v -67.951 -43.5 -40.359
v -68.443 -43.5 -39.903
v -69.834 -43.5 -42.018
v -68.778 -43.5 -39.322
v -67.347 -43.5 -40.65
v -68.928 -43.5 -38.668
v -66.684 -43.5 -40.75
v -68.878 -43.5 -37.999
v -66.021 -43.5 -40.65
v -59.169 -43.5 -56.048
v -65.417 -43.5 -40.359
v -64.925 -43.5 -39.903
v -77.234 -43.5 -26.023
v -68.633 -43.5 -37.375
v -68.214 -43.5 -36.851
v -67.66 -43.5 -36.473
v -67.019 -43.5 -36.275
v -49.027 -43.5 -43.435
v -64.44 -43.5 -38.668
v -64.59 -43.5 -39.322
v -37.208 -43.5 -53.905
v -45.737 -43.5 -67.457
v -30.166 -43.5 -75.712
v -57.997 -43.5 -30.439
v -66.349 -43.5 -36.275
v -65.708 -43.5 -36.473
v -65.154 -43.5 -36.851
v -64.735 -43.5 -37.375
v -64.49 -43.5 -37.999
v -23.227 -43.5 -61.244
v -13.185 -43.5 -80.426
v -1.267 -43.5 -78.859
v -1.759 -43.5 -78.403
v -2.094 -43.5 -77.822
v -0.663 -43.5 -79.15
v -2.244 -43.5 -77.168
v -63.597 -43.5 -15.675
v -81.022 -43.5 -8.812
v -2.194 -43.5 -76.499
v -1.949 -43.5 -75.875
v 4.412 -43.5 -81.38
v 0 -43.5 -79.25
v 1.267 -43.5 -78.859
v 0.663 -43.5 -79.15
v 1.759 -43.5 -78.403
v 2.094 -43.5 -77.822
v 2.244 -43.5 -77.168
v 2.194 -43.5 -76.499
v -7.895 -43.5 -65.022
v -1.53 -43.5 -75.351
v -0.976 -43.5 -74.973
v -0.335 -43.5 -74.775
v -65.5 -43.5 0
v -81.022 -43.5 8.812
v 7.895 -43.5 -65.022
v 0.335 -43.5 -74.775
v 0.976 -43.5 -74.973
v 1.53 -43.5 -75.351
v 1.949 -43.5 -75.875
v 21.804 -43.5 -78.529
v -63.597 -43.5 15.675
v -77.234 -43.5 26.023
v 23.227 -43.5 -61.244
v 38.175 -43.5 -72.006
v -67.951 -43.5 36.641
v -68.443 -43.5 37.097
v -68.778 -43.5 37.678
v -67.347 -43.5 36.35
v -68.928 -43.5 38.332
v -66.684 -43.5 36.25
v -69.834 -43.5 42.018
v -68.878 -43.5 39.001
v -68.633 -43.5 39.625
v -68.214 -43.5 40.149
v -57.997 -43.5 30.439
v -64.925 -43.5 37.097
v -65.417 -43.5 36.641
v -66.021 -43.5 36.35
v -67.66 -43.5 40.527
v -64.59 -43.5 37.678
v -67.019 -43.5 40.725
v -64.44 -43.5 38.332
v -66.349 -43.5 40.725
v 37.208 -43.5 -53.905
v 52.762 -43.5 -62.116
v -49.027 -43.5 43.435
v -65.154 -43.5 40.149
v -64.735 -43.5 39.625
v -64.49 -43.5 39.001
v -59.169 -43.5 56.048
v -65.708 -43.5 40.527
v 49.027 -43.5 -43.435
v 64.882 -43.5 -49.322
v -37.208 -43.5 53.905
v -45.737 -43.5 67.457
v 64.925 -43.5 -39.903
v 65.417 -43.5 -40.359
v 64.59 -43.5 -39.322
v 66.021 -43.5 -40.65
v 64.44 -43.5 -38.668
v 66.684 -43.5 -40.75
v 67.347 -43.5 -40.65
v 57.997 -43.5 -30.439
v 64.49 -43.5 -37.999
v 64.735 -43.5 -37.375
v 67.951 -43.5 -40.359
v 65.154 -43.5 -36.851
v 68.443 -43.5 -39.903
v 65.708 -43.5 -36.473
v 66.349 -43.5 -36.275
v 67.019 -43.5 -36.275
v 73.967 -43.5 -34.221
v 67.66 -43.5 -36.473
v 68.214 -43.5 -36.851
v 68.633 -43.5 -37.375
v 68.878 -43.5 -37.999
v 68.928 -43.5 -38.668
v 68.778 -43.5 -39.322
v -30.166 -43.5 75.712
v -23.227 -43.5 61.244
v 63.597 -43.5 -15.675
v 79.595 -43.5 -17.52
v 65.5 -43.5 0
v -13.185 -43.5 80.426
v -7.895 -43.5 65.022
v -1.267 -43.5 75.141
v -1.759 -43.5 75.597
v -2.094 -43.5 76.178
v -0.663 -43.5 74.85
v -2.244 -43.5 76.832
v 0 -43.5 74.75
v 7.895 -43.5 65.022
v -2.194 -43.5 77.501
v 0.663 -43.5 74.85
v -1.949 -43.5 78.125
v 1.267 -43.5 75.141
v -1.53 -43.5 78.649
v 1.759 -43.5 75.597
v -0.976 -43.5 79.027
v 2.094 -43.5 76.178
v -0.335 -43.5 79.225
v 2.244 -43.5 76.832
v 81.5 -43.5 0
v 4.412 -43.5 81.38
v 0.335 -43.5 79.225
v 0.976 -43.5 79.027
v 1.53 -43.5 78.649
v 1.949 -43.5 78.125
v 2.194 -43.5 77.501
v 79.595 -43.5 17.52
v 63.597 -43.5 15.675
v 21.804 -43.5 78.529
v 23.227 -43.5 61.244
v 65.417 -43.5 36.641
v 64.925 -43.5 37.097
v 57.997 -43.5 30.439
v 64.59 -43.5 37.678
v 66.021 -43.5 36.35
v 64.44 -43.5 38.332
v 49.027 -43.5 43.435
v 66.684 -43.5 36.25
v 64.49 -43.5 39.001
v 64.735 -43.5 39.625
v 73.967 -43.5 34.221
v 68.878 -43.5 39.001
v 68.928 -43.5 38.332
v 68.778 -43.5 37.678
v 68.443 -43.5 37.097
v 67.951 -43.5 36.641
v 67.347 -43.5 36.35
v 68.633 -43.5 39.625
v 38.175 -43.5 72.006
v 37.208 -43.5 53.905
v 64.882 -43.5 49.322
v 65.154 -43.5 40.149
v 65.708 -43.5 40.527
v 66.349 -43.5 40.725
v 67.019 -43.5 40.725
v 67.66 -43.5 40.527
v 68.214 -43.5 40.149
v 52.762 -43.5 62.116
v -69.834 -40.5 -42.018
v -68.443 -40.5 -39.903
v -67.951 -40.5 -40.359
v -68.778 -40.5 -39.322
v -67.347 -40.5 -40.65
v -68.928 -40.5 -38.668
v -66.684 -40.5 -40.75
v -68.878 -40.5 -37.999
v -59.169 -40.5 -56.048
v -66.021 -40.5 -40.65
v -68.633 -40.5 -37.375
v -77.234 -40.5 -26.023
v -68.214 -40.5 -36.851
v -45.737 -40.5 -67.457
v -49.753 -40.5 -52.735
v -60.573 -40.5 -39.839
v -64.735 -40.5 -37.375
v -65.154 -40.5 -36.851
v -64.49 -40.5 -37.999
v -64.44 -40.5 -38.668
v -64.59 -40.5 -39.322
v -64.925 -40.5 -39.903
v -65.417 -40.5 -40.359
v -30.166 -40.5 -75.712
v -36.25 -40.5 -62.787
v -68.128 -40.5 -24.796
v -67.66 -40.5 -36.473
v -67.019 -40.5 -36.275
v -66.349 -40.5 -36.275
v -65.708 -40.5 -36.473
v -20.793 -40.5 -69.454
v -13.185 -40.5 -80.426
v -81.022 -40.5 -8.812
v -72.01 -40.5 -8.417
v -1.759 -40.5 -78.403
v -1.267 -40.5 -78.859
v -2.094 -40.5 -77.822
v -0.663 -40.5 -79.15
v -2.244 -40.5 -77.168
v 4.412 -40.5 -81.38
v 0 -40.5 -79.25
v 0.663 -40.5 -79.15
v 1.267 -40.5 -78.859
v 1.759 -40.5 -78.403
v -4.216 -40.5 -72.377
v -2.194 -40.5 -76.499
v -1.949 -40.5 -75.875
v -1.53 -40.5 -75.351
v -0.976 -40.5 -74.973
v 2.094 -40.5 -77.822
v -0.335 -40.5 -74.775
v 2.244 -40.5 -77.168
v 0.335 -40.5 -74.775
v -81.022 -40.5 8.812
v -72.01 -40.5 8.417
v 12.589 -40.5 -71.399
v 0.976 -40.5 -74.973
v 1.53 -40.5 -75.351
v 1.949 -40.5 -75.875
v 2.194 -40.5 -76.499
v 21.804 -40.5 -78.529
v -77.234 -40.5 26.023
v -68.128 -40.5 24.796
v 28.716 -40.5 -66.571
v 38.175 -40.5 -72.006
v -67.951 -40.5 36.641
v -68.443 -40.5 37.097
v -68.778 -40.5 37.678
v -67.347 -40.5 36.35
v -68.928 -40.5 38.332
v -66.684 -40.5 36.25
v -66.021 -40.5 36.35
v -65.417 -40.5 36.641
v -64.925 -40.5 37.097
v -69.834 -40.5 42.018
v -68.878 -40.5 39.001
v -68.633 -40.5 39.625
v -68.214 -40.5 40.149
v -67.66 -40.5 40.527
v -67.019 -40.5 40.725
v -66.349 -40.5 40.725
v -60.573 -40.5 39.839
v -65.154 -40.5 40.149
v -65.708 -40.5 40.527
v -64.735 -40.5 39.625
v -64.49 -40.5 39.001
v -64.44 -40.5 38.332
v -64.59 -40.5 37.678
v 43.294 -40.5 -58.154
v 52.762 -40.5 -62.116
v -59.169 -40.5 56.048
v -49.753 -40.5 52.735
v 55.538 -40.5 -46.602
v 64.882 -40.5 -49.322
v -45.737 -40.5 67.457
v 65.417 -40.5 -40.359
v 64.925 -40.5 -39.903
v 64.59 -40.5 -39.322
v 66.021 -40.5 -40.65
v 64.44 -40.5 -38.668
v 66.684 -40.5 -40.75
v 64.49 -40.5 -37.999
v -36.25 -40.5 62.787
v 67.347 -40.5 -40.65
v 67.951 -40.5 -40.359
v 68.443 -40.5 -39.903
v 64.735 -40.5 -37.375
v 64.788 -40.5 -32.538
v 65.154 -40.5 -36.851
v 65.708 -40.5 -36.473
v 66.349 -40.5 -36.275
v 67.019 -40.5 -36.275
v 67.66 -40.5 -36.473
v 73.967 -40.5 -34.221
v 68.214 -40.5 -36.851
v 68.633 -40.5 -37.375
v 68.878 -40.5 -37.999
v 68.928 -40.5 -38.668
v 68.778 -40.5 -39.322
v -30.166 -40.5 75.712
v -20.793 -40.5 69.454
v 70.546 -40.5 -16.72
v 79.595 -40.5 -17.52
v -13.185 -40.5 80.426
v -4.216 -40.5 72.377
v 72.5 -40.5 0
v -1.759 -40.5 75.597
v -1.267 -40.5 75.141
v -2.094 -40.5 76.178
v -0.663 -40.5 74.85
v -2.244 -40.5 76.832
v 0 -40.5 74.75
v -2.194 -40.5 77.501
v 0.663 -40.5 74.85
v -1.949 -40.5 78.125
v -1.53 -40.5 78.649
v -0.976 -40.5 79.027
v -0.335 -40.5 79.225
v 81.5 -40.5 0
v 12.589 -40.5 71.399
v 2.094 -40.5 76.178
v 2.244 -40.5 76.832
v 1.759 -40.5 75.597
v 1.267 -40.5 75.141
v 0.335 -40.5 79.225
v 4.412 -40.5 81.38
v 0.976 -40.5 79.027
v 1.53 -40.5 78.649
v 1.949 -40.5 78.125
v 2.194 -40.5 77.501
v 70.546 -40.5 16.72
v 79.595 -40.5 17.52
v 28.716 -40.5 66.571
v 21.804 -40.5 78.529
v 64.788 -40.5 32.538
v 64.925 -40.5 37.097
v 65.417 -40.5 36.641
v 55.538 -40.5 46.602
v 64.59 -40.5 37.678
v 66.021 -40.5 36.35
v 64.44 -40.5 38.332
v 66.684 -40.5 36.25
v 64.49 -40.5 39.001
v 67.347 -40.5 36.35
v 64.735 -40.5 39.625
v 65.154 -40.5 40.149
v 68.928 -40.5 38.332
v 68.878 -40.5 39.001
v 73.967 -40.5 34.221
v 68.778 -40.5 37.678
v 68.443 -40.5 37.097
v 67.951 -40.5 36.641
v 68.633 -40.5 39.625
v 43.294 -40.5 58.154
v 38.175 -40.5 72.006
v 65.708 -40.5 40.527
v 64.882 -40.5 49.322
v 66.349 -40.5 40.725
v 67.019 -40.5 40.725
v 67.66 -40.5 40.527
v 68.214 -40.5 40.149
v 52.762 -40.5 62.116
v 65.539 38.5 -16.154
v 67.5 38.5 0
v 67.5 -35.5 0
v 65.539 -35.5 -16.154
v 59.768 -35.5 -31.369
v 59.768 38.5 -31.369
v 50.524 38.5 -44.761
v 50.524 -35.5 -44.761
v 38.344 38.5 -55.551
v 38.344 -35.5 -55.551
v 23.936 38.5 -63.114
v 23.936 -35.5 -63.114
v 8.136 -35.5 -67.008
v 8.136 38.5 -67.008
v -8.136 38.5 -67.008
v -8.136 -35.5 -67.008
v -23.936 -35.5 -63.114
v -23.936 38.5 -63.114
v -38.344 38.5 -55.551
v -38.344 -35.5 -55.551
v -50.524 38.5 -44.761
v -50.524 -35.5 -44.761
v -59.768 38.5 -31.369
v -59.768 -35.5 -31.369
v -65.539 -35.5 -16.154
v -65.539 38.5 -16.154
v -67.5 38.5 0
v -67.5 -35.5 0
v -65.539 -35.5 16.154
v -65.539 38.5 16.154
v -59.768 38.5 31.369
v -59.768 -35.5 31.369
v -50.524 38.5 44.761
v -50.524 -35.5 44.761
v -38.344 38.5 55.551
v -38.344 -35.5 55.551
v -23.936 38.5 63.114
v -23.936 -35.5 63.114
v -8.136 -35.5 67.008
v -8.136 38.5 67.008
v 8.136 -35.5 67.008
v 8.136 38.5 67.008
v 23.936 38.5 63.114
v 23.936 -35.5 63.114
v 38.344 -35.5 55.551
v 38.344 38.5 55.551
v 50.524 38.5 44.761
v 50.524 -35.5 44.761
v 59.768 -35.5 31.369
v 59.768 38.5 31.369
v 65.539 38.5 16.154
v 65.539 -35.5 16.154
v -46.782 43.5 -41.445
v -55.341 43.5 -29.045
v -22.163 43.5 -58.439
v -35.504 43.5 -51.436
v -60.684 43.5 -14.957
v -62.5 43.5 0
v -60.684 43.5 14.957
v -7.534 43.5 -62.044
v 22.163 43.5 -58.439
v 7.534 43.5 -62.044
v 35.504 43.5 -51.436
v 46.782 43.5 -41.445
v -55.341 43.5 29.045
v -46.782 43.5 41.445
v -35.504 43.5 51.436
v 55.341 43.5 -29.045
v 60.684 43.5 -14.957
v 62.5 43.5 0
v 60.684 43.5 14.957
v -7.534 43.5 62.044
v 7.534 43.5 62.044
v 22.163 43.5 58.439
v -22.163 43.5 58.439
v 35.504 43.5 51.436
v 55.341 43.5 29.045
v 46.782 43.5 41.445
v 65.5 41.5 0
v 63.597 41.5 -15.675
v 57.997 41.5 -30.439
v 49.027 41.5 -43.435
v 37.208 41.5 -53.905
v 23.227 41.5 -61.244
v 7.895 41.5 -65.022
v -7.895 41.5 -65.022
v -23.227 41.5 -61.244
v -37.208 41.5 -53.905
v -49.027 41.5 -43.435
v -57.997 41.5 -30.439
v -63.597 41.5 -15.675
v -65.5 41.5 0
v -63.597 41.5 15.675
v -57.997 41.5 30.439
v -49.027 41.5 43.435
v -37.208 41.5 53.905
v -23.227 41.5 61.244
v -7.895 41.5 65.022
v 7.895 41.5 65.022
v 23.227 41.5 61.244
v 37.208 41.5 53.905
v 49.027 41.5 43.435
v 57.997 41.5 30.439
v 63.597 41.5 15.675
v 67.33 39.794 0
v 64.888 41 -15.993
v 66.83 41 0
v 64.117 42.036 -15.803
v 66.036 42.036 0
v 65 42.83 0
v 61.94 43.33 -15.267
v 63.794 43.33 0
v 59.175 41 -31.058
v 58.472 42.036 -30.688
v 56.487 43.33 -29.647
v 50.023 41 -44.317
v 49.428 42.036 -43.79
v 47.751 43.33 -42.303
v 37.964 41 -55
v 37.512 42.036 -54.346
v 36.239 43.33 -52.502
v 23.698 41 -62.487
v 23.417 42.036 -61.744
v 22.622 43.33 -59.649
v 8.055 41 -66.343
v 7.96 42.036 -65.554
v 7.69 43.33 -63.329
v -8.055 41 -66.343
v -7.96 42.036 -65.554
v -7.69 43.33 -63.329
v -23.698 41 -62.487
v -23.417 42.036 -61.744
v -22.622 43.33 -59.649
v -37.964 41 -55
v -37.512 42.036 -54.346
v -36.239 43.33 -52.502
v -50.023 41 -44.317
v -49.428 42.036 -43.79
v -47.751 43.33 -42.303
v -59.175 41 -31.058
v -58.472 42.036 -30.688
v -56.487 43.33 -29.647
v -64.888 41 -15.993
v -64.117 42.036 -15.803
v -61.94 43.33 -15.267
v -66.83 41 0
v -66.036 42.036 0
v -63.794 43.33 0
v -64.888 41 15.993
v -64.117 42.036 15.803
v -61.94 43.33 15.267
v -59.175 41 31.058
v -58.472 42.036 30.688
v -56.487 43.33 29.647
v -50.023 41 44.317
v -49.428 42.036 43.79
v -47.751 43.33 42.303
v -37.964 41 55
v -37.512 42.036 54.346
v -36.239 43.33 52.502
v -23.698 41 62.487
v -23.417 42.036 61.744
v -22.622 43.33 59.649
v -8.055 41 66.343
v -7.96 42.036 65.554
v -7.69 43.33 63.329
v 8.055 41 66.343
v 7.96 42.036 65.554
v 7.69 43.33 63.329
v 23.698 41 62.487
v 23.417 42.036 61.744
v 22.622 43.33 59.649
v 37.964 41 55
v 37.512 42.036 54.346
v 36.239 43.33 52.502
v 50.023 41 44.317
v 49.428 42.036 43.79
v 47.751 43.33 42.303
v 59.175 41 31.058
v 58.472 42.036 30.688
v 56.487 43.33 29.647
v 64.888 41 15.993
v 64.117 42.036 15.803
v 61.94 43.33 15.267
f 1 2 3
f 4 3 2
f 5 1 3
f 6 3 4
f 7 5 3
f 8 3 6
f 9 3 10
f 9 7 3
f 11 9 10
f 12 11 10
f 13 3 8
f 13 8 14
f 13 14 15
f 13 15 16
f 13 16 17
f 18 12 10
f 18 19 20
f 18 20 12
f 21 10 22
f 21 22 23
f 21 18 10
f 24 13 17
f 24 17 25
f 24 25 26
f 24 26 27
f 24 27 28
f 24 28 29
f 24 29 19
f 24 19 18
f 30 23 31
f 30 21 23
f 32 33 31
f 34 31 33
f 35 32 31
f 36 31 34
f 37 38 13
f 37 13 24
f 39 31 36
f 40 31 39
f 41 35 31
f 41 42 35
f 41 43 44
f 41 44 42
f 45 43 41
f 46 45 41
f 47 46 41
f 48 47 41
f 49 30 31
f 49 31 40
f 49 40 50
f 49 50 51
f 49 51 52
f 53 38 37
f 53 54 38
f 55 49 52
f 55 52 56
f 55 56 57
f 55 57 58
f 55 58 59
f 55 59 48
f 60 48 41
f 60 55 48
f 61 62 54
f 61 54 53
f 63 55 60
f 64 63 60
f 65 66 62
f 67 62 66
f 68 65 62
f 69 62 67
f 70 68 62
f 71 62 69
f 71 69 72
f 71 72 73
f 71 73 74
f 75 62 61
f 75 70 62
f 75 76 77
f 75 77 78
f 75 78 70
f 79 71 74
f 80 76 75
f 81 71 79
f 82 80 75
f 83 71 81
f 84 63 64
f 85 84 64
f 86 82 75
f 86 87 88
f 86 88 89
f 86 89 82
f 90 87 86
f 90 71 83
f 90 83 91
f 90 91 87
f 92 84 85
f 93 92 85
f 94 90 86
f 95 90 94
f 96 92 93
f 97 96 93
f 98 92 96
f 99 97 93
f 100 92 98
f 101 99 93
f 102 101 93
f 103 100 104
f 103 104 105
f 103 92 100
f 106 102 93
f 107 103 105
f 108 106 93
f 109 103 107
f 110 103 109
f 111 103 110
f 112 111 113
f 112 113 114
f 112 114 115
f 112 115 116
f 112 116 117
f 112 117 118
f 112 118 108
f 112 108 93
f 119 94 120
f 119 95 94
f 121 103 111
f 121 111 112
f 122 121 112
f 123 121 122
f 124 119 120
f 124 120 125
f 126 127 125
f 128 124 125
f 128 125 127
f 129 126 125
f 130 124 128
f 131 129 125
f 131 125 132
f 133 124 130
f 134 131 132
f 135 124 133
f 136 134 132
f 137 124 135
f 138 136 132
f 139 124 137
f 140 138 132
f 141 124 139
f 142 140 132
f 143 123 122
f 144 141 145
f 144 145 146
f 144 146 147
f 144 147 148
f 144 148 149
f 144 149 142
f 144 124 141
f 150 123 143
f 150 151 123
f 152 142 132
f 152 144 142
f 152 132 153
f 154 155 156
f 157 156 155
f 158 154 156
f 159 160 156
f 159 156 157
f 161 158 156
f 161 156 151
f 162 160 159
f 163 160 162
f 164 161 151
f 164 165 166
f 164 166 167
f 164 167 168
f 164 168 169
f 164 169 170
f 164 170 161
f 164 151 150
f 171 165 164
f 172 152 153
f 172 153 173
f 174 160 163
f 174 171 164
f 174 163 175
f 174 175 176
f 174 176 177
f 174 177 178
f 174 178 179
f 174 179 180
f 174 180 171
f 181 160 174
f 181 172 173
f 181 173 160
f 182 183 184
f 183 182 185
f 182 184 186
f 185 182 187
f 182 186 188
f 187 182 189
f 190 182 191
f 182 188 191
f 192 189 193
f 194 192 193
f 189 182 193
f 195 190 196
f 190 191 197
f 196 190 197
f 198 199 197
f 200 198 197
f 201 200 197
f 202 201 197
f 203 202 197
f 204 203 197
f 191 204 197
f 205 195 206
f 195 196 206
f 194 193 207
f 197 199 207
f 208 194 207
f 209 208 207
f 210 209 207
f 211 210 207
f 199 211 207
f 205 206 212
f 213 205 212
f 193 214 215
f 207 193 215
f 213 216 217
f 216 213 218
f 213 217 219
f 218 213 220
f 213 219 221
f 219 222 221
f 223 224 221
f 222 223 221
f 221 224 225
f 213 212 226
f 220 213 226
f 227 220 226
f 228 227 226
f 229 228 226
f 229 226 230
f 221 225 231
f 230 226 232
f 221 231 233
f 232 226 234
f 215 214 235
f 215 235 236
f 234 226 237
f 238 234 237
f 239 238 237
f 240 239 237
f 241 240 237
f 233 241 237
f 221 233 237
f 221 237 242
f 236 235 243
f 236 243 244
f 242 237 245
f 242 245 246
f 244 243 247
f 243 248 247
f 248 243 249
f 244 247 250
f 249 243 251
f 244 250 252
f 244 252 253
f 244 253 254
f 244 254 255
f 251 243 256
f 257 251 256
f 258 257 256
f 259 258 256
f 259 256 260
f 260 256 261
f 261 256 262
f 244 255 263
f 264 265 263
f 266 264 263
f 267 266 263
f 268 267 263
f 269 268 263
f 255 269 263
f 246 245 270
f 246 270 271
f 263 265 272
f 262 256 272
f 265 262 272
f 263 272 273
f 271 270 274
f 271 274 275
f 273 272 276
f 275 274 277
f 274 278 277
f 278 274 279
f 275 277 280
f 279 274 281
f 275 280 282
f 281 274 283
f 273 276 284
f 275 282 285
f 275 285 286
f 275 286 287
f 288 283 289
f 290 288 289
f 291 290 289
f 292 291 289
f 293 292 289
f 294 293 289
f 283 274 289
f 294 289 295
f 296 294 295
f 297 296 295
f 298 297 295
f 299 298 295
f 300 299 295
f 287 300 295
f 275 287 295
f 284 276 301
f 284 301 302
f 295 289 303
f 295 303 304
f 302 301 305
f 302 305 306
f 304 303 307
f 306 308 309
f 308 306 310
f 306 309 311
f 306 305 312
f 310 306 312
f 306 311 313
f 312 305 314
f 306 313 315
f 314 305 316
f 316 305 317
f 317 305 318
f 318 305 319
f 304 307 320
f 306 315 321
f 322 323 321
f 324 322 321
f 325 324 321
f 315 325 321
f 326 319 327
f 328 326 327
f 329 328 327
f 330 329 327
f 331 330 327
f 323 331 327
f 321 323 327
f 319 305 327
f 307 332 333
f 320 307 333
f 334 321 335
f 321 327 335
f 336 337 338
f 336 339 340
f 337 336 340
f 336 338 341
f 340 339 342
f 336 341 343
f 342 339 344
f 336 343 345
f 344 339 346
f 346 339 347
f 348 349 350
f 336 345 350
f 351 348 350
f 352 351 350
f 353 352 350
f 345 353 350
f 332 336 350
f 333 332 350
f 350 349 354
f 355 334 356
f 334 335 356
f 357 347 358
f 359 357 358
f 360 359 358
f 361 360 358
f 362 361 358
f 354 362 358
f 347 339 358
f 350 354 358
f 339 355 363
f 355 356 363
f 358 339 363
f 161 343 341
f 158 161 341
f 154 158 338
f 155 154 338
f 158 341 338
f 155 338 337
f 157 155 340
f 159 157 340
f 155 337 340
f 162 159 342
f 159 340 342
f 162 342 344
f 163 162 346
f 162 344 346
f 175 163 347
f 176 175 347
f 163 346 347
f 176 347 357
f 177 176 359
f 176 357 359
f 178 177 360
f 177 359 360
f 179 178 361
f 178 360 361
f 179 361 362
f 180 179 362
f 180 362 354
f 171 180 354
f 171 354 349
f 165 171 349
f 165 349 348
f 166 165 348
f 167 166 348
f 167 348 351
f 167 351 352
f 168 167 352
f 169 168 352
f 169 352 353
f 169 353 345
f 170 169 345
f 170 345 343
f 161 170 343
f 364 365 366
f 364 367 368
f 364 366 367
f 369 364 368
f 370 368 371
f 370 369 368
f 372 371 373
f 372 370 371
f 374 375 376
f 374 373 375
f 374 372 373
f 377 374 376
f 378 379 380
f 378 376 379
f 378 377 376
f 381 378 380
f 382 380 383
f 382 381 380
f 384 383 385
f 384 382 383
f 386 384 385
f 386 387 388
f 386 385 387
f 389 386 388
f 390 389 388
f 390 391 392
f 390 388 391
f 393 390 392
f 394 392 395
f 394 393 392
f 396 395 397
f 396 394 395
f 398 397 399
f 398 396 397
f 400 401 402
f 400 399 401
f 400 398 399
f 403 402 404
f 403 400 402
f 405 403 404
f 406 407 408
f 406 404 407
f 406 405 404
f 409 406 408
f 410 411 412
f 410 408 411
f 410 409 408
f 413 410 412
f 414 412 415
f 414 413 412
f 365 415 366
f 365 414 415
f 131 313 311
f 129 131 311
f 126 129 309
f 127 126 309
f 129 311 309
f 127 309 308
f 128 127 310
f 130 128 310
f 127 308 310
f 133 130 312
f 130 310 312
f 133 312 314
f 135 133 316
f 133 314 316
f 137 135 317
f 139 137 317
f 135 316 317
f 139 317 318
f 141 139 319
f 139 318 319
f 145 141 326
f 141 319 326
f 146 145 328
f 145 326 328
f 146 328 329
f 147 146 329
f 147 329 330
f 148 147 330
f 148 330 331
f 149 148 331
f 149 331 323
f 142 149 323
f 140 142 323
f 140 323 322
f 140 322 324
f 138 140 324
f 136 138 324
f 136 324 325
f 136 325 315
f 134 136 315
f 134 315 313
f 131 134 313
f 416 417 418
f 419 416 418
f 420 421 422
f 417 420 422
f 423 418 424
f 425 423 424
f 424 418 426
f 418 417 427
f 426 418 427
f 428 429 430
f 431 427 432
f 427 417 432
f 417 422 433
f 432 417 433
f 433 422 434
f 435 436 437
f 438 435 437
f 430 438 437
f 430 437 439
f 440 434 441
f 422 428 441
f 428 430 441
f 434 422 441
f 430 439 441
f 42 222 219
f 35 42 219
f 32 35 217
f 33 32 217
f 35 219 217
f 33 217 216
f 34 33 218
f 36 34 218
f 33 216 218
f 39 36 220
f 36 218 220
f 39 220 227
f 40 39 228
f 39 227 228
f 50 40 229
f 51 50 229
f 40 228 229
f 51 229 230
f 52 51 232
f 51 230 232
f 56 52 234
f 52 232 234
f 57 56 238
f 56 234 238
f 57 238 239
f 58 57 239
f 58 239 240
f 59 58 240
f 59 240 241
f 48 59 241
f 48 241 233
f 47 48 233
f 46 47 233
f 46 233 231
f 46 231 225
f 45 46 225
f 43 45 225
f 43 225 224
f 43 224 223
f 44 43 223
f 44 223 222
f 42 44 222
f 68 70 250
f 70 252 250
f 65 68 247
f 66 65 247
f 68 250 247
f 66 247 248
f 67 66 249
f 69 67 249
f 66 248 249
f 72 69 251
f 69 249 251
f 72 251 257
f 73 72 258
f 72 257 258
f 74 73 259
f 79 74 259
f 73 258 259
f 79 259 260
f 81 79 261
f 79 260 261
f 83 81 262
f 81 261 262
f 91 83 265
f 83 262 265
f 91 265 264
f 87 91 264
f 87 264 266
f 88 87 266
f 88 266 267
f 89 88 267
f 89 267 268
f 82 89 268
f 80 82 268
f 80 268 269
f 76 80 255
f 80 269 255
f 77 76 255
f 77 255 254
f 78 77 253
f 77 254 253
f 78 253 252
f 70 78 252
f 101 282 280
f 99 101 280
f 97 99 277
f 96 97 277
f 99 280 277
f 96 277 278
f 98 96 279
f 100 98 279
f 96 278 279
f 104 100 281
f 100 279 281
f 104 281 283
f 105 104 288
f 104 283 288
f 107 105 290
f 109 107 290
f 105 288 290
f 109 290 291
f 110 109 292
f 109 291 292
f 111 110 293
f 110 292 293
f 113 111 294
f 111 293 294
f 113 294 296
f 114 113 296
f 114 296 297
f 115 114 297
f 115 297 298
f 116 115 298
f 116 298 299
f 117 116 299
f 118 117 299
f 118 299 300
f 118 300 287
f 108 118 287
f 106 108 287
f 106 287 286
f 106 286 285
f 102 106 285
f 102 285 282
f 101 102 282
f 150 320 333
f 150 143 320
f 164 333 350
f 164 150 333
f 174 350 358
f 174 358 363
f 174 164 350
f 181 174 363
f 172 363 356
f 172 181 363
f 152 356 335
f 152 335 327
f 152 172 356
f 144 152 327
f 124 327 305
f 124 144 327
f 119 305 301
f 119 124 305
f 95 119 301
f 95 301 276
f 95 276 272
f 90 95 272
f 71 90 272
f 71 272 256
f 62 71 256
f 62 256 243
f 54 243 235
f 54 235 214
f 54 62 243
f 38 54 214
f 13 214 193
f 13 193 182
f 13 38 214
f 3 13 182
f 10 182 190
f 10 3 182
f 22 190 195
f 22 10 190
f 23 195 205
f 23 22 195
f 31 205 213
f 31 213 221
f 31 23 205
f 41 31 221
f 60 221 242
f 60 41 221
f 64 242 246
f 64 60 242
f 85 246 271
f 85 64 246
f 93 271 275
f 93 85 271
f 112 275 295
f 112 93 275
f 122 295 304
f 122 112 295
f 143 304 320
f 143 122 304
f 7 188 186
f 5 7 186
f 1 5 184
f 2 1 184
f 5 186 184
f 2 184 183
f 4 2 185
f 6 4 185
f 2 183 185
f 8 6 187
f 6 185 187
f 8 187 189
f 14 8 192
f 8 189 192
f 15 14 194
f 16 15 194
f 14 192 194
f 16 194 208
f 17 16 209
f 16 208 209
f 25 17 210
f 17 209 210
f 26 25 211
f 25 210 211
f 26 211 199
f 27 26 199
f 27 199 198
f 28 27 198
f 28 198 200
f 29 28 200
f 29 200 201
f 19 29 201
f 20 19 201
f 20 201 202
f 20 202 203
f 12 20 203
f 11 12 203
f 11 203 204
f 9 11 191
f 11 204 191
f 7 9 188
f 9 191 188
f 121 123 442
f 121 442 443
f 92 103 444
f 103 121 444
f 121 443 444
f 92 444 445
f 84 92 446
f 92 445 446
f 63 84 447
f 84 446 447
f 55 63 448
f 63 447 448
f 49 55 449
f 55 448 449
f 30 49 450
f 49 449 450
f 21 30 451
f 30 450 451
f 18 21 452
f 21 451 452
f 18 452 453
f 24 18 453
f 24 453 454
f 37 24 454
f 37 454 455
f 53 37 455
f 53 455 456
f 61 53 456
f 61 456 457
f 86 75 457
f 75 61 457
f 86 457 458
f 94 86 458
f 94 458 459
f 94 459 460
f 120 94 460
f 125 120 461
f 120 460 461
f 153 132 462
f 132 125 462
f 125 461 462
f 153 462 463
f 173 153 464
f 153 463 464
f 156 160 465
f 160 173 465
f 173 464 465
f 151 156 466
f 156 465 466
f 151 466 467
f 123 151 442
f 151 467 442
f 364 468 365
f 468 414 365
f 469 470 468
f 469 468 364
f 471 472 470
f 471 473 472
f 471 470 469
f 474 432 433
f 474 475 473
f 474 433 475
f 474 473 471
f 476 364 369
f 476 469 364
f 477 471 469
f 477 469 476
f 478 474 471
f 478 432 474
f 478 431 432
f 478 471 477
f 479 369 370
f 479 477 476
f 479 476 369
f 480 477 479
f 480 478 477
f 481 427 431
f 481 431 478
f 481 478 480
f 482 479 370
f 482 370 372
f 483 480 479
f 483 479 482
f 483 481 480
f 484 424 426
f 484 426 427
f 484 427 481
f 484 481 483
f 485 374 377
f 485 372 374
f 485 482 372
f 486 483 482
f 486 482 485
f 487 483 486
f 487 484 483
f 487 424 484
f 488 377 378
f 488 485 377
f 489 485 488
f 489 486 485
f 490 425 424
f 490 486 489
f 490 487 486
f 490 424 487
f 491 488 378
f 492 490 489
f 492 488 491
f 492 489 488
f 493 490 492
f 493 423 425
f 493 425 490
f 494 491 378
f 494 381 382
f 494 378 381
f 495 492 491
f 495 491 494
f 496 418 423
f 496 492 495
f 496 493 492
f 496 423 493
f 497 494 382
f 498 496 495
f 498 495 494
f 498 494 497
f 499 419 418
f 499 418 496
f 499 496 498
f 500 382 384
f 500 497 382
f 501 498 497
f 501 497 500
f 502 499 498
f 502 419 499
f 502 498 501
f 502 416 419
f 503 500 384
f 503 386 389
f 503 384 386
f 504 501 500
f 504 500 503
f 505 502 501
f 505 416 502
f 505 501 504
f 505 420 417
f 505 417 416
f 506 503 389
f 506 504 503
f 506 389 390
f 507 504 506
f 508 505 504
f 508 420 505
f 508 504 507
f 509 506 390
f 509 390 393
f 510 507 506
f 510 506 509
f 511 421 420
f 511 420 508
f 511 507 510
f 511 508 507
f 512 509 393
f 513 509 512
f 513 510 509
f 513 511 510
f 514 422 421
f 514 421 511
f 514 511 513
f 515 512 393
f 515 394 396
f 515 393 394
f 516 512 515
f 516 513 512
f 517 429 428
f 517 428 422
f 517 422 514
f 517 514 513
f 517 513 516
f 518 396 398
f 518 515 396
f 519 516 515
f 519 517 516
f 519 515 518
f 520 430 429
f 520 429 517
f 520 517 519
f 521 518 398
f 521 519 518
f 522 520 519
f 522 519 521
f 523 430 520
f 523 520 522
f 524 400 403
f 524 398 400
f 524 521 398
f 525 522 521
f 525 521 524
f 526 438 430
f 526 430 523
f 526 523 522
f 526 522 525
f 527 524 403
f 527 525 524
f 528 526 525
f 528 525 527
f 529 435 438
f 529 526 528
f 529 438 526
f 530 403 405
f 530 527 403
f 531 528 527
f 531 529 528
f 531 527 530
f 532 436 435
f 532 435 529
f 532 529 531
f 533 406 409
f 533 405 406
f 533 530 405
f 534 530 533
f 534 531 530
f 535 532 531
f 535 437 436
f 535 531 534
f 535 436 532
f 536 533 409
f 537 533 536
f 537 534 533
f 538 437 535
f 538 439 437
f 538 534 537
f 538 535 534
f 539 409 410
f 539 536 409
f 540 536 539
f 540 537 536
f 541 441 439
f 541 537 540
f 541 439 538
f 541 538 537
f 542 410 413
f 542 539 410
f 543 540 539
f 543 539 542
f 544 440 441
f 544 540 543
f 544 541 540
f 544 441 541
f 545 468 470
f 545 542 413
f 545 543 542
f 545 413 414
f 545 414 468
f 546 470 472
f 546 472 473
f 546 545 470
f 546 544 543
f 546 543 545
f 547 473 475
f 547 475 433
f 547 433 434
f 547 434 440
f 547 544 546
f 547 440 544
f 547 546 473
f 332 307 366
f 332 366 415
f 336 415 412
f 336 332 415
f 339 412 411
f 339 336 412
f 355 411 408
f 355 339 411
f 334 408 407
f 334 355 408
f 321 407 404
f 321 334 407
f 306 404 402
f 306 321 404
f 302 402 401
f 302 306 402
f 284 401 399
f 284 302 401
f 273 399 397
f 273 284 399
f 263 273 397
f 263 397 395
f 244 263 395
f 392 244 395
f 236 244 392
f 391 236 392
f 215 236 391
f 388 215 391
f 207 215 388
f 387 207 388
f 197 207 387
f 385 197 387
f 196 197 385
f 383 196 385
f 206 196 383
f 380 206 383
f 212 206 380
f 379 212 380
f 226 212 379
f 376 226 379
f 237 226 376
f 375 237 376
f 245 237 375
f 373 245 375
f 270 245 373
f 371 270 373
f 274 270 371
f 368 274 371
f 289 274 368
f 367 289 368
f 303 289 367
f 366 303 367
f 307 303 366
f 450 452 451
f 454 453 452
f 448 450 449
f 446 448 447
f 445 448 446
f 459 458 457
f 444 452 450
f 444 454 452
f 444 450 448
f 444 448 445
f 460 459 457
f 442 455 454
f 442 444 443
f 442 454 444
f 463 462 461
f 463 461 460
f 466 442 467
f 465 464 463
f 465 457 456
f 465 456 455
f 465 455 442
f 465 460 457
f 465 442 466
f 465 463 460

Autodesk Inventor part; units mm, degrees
ref_plane "YZ Plane" through (0, 0, 0) normal (1, 0, 0) x (0, 1, 0)
ref_plane "XZ Plane" through (0, 0, 0) normal (0, 1, 0) x (-1, 0, 0)
ref_plane "XY Plane" through (0, 0, 0) normal (0, 0, 1) x (1, 0, 0)
sketch "Sketch1" plane through (0, 0, 0) normal (0, 0, 1) x (1, 0, 0)
  line L0 (-16.3, 0) -> (97.8, 0) construction
  line L1 (0, 60.9) -> (0, -60.9) construction
  line L2 (65.5, -43.5) -> (65.5, 41.5)
  line L3 (81.5, -40.5) -> (81.5, -43.5)
  line L4 (81.5, -43.5) -> (65.5, -43.5)
  line L5 (67.5, -35.5) -> (67.5, 43.5)
  line L6 (81.5, -40.5) -> (72.5, -40.5)
  line L7 (72.5, -40.5) -> (67.5, -35.5)
  line L8 (67.5, 43.5) -> (0, 43.5)
  line L9 (65.5, 41.5) -> (0, 41.5)
  line L10 (0, 43.5) -> (0, 41.5)
  point P0 (0, 0)
  dimension "d5" = 81.5
  dimension "d7" = 9
  dimension "d8" = 5
  dimension "d9" = 45
  dimension "d10" = 16
  dimension "d11" = 3
  dimension "d30" = 2
  dimension "d32" = 2
  dimension "d34" = 87
revolve "Revolution1" add sketch "Sketch1" angle 360 about axis through (0, 0, 0) along (0, -1, 0)
sketch "Sketch2" plane through (0, -43.5, 0) normal (0, -1, 0) x (1, 0, 0)
  line L0 (0, 114.1) -> (0, -114.1) construction
  line L1 (-114.1, 0) -> (114.1, 0) construction
  circle A0 centre (0, 0) radius 81.5 construction
  circle A1 centre (0, 0) radius 65.5 construction
  circle A2 centre (0, 0) radius 77 construction
  circle A3 centre (0, 0) radius 72.5 construction
  point P0 (0, 77)
  point P1 (-66.684, 38.5)
  point P2 (-66.684, -38.5)
  point P3 (0, -77)
  point P4 (66.684, -38.5)
  point P5 (66.684, 38.5)
  dimension "d16" = 4.5
  dimension "d20" = 360
  dimension "d29" = 4.5
hole "Hole1" at (0, -43.5, 77) at (-66.684, -43.5, 38.5) at (-66.684, -43.5, -38.5) at (0, -43.5, -77) at (66.684, -43.5, -38.5) at (66.684, -43.5, 38.5) direction (0, 1, 0) diameter 4.5 depth 13 tip angle 118 clearance for "Flat Head Machine Screw" size "M4" standard "Ansi Metric M Profile"
fillet "Fillet1" radius 5 1 edges at (-67.5, 43.5, 0)
equation "\"d16\" = d29"
properties part number "Cover_Joint_1_2" material "Aluminum 6061"
